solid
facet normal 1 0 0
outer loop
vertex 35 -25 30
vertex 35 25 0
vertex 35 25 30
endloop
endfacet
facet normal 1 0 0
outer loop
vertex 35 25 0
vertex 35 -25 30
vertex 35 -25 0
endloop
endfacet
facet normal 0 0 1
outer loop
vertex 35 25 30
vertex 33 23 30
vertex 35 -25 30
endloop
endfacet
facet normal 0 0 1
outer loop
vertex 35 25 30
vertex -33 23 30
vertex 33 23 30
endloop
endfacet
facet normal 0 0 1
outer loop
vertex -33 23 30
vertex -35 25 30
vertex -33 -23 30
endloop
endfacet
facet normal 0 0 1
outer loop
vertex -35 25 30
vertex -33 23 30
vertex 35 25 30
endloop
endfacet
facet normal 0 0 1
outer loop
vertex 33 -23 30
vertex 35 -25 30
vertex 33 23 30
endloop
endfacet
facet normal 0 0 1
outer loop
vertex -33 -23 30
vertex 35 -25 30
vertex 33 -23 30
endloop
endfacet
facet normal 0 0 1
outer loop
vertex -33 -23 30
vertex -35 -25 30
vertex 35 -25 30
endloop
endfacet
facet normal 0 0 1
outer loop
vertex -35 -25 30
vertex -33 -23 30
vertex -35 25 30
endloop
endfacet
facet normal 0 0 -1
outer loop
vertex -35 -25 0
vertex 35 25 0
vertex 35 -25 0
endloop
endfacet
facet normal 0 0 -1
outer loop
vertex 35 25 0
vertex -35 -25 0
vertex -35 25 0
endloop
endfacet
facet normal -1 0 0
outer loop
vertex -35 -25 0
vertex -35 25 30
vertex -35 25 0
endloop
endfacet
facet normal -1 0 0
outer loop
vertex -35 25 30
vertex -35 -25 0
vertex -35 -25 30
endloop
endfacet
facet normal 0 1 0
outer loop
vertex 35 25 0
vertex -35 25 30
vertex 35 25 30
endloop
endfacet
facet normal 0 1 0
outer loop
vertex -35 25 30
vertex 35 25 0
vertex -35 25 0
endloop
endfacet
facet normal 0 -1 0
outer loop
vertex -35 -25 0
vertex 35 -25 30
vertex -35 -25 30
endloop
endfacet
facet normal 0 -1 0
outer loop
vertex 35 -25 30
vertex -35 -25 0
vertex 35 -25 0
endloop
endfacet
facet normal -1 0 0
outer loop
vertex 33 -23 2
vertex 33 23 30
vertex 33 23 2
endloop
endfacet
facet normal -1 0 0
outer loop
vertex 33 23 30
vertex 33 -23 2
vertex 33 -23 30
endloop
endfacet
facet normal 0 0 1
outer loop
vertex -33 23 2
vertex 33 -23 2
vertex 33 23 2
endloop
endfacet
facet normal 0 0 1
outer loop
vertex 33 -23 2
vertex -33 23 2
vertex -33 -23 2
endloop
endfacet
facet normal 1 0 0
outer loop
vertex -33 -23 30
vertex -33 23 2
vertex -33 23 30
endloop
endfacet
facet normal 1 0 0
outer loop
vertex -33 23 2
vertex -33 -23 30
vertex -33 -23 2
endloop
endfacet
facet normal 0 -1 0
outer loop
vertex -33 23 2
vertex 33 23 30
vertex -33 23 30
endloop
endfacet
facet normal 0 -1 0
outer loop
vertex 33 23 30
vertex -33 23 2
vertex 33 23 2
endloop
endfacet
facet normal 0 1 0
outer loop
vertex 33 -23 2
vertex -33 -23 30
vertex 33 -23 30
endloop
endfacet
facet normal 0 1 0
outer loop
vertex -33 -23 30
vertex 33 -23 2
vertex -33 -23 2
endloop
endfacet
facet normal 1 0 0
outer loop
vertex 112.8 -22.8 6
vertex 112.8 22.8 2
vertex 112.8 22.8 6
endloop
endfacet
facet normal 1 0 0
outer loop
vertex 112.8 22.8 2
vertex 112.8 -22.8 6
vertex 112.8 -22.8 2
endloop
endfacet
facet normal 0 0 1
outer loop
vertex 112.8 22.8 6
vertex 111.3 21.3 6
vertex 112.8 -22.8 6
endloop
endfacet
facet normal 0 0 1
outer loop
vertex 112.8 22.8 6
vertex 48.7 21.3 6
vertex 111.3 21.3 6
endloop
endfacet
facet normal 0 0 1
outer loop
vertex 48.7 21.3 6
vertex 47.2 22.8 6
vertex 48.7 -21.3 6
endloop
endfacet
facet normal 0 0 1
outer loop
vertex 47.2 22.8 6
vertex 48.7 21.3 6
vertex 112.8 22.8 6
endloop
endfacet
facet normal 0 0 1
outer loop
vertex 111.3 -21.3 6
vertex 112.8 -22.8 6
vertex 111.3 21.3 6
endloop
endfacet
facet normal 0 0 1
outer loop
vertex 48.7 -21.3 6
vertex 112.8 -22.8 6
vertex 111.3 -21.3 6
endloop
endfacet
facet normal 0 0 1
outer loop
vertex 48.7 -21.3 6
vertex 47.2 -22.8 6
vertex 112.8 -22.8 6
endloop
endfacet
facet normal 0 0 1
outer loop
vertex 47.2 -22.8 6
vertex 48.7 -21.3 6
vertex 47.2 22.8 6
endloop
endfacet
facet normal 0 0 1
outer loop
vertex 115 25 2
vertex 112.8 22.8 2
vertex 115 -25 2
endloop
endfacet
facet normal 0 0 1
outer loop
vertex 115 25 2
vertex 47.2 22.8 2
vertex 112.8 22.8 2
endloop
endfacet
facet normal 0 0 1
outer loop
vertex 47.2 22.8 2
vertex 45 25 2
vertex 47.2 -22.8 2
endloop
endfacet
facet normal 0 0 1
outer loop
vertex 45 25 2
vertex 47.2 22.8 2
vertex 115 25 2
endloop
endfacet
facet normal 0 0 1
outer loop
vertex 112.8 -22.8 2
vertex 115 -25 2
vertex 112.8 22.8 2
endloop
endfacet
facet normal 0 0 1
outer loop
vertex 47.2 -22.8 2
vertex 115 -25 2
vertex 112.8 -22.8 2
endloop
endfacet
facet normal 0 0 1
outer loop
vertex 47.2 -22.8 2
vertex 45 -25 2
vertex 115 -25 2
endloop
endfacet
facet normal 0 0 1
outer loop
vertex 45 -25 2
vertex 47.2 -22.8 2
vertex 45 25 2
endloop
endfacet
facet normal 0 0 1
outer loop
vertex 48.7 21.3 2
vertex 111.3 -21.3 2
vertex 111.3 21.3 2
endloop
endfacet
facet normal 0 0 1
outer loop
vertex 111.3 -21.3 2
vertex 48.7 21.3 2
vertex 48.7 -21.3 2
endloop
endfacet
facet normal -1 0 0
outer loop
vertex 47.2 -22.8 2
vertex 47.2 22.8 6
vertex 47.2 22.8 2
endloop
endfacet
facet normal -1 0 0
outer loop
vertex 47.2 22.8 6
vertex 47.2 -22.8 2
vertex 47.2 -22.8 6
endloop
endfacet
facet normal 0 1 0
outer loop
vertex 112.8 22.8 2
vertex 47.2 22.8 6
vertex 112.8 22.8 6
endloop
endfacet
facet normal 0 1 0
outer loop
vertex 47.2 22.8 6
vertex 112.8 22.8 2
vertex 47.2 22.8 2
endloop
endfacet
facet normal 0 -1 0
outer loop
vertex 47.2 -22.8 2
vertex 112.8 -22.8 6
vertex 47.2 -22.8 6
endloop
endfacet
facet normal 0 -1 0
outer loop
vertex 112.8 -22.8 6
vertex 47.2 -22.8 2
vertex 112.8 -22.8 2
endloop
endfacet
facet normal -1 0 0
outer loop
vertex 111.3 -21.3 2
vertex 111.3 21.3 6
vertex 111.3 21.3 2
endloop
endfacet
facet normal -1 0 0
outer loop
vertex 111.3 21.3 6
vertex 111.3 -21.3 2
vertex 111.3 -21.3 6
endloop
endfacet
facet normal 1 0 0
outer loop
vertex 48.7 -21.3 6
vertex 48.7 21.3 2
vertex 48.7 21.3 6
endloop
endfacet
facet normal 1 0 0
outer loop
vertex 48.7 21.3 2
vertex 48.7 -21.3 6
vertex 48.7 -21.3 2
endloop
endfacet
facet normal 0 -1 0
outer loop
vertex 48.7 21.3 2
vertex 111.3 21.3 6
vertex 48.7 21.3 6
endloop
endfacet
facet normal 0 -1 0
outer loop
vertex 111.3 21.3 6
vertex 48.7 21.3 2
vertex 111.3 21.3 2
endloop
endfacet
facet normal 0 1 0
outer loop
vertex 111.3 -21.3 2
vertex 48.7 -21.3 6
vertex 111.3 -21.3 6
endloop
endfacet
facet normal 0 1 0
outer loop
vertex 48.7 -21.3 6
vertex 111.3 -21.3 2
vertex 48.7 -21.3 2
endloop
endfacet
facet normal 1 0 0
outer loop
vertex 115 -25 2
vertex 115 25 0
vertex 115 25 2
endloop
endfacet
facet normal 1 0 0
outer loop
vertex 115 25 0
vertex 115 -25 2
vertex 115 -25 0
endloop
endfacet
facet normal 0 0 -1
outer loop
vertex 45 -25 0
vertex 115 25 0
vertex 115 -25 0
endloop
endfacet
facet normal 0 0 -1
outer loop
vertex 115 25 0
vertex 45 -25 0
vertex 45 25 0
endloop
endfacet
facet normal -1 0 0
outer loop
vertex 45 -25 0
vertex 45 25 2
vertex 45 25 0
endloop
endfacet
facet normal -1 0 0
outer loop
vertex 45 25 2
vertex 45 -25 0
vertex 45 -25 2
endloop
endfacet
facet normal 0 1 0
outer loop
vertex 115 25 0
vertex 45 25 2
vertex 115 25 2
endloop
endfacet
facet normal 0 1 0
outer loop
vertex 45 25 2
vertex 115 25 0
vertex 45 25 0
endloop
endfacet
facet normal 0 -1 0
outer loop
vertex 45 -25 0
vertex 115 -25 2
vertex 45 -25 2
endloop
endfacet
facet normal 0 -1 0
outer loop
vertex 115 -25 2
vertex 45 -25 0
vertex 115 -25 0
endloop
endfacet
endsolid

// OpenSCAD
// Parameters
$fn = 64;

// Part 1: Box dimensions (mm)
box_width = 70;           // Outer width (X)
box_depth = 50;           // Outer depth (Y)
box_height = 30;          // Outer height (Z)
box_wall = 2;             // Wall thickness
box_floor = 2;            // Floor thickness

// Part 2: Lid dimensions (mm)
lid_plate_width = 70;     // Plate width (X)
lid_plate_depth = 50;     // Plate depth (Y)
lid_plate_thickness = 2;  // Plate thickness (Z)
lip_outer_width = 65.6;   // Lip outer width (X)
lip_outer_depth = 45.6;   // Lip outer depth (Y)
lip_height = 4;           // Lip height (Z)
lip_wall_thickness = 1.5; // Lip wall thickness

// Layout
gap = 10;                 // Gap between the two parts

// --- Part 1: The Box ---
// Rests on the XY plane at Z=0 and is centered on X and Y.
module box() {
    difference() {
        // Outer shell
        translate([-box_width/2, -box_depth/2, 0])
            cube([box_width, box_depth, box_height]);
        
        // Inner cavity
        // We subtract the floor and walls. 
        // The cavity starts at Z = floor_thickness.
        // We extend the cavity slightly past the top to ensure a clean cut.
        translate([-box_width/2 + box_wall, -box_depth/2 + box_wall, box_floor])
            cube([box_width - 2 * box_wall, box_depth - 2 * box_wall, box_height - box_floor + 0.1]);
    }
}

// --- Part 2: The Lid ---
// Printed with the plate on the bed and the lip on top.
// Centered on its own origin, then translated to the +X side of the box.
module lid() {
    union() {
        // The base plate
        translate([-lid_plate_width/2, -lid_plate_depth/2, 0])
            cube([lid_plate_width, lid_plate_depth, lid_plate_thickness]);
        
        // The rectangular lip
        // Centered on the plate, sitting on top of it.
        translate([-lip_outer_width/2, -lip_outer_depth/2, lid_plate_thickness])
            difference() {
                // Outer lip shape
                cube([lip_outer_width, lip_outer_depth, lip_height]);
                
                // Inner hollow part of the lip
                // We extend the cut slightly in Z to ensure a clean cut.
                translate([lip_wall_thickness, lip_wall_thickness, -0.01])
                    cube([lip_outer_width - 2 * lip_wall_thickness, lip_outer_depth - 2 * lip_wall_thickness, lip_height + 0.02]);
            }
    }
}

// --- Final Assembly ---

// Render the box at the origin
box();

// Render the lid on the +X side of the box
// The box ends at X = box_width/2.
// The gap starts at box_width/2 + gap.
// The lid's own center is at lid_plate_width/2.
translate([box_width/2 + gap + lid_plate_width/2, 0, 0])
    lid();
